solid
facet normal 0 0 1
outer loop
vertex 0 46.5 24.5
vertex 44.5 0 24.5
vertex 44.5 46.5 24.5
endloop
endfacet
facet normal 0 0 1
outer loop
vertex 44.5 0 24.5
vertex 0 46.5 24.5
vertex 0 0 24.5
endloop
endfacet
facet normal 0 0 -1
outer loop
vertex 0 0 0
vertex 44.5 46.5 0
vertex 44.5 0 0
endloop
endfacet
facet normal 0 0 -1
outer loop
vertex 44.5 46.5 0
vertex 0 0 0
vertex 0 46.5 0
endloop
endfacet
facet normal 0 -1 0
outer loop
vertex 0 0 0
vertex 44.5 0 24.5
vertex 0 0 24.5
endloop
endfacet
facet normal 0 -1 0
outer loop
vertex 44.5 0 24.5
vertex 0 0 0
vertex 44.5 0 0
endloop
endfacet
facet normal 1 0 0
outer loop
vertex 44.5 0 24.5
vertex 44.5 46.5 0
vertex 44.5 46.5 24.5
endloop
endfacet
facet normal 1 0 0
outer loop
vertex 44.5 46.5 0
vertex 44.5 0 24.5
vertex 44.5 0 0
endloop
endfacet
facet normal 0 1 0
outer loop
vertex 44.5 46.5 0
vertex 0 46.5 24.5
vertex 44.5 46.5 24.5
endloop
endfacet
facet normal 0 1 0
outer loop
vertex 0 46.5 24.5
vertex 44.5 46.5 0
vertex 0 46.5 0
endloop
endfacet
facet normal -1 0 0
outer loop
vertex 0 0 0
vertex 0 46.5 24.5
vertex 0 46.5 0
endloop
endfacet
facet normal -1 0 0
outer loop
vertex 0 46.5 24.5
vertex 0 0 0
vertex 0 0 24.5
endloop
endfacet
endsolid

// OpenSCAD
// file: e3d_v6_all_metall_hotend.scad
/*
Name: E3D-v6 All Metal HotEnd in OpenSCAD
Author: Jons Collasius from Germany/Hamburg

License: CC BY-NC-SA 4.0
License URL: https://creativecommons.org/licenses/by-nc-sa/4.0/

Creator of "E3D-v6 All Metal HotEnd": E3D Online - JR 
URL E3D v6: http://wiki.e3d-online.com/wiki/E3D-v6_Documentation
*/

// ######################################################################################################################

/* [Global] */
// detail level
detaillevel = 1; // [0:coarse render only outlines,1:fine render with all details]

//e3d($fs = 1);

// ######################################################################################################################
module e3d() {
	difference() {
		union() {
			translate([0,0,0]) fncylinder(r=8,h=7);
			translate([0,0,6]) fncylinder(r=6,h=8);
			translate([0,0,13]) fncylinder(r=8,h=8);
			translate([0,0,20]) fncylinder(r=11.15,h=26);
			translate([0,0,0]) fncylinder(r=8,h=7);
			translate([0,0,45]) fncylinder(r=2,h=4.1);
			translate([-8,-4.5,48.1]) chamfercube([16,20,11.5],side=[0.4,0.4,0.4,0.4],top=[0.4,0.4,0.4,0.4],bottom=[0.4,0.4,0.4,0.4]);
			translate([0,0,58.6]) fncylinder(r=2.5,h=3);
			translate([0,0,60.6]) fncylinder(r=4.03,h=3,$fn=6);
			translate([0,0,62.6]) fncylinder(r=3,r2=0.5,h=3);
		}
		if(detaillevel==1) {
			translate([0,0,-1]) fncylinder(r=1.6,h=64.1);
			translate([0,0,62.1]) fncylinder(r=0.25,h=4,fn=10);
			translate([0,0,16]) fnpipe(r=9,r2=4.475,h=1.5); 
			translate([0,0,18.5]) fnpipe(r=9,r2=4.475,h=1.5); 
			for ( i = [0 : 9] ) {
				translate([0,0,21+i*2.5]) fnpipe(r=12.15,r2=4.475+i*0.15,h=1.5); 
			}
			translate([-9,8,55.6]) rotate([0,90,0]) fncylinder(r=3.05, h=18);
			translate([-9,8,54.6]) cube([18,8.5,2]);
			translate([0,13,47.1]) fncylinder(r=1.4, h=13.5);
			translate([4.45,-1,54.8]) rotate([0,90,0]) fncylinder(r=1.4, h=4.45);
			translate([3.45,-2.5,57.6]) rotate([0,90,0]) fncylinder(r=1.15, h=5.45);
		}
	}
}

// ######################################################################################################################
module chamfercube(xyz=[0,0,0],side=[0,0,0,0],top=[0,0,0,0],bottom=[0,0,0,0],x=false,y=false,z=false) {
	translate([x==true?-xyz[0]/2:0,y==true?-xyz[1]/2:0,z==true?-xyz[2]/2:0]) difference() {
		cube(xyz);
		if(side[0]>=0) translate([0,0,xyz[2]/2]) rotate([0,0,45]) cube([side[0]*2,side[0]*3,xyz[2]+2],center=true);
		if(side[1]>=0) translate([xyz[0],0,xyz[2]/2]) rotate([0,0,-45]) cube([side[1]*2,side[1]*3,xyz[2]+2],center=true);
		if(side[2]>=0) translate([xyz[0],xyz[1],xyz[2]/2]) rotate([0,0,45]) cube([side[2]*2,side[2]*3,xyz[2]+2],center=true);
		if(side[3]>=0) translate([0,xyz[1],xyz[2]/2]) rotate([0,0,-45]) cube([side[3]*2,side[3]*3,xyz[2]+2],center=true);
		if(top[0]>=0) translate([xyz[0]/2,0,xyz[2]]) rotate([-45,0,0]) cube([xyz[0]+2,top[0]*2,top[0]*3,],center=true);
		if(top[2]>=0) translate([xyz[0]/2,xyz[1],xyz[2]]) rotate([45,0,0]) cube([xyz[0]+2,top[2]*2,top[2]*3,],center=true);
		if(top[3]>=0) translate([0,xyz[1]/2,xyz[2]]) rotate([0,45,0]) cube([top[3]*2,xyz[1]+2,top[3]*3,],center=true);
		if(top[1]>=0) translate([xyz[0],xyz[1]/2,xyz[2]]) rotate([0,-45,0]) cube([top[1]*2,xyz[1]+2,top[1]*3,],center=true);
		if(bottom[0]>=0) translate([xyz[0]/2,0,0]) rotate([45,0,0]) cube([xyz[0]+2,bottom[0]*2,bottom[0]*3,],center=true);
		if(bottom[2]>=0) translate([xyz[0]/2,xyz[1],0]) rotate([-45,0,0]) cube([xyz[0]+2,bottom[2]*2,bottom[2]*3,],center=true);
		if(bottom[3]>=0) translate([0,xyz[1]/2,0]) rotate([0,-45,0]) cube([bottom[3]*2,xyz[1]+2,bottom[3]*3,],center=true);
		if(bottom[1]>=0) translate([xyz[0],xyz[1]/2,0]) rotate([0,45,0]) cube([bottom[1]*2,xyz[1]+2,bottom[1]*3,],center=true);
	}	
}

// ######################################################################################################################
module fnpipe(r,r2,h) {
    difference() {
        fncylinder(r=r,h=h);
        translate([0,0,-1]) fncylinder(r=r2,h=h+2);
    }
}

// ######################################################################################################################
module fncylinder(r,r2,h,fn){
    cylinder(r=r,r2=r2,h=h);
    /*
    if (r2==undef) {
        cylinder(r=r,h=h);
    } else {
        cylinder(r=r,r2=r2,h=h);
    }*/
}
// main file
fnresolution = 1;
include <e3d_v6_all_metall_hotend.scad>;

xplate_t = 3.2;

/*
translate([0,xplate_t,0])
rotate([90,0,0])
translate([-111.75,0,0]) import("X_-_plate.stl");*/

//translate([0,0,65.6]) rotate([180,0,0]) e3d($fs = 1);
//import("E3D_V6_1.75mm_Universal_HotEnd_Mockup.stl");


module titan() {
    cube([44.5, 46.5, 24.5]);
    // chamfer 4.5 (left-bottom edge)
    
    // holes 
    //5.65, 7.65 
    
    // 15.5 45 degree line
    // 90 degree rot 3 hole
    
    // 1 bottom hole
    // 2.65, 1.65
    // dia 16.5
    // depth 1.4
    
    // 2 bottom hole
    // 12.5 dia
    // depth 6 mm
    
    // 3 bottom hole
    // dia same as 1
    // depth 5 mm
    
    // 15 mm offset from front
    // dia 34 third hole
    // depth 4mm
    
}

module emotor() {
    
    cube([42.3, 42.3, 22.75]);
    // hole 3mm offset [15.5, 15.5] mm from center
    // chamfer diagonal 54

    // front dia 22mm offset center depth 2mm
    
    
    // connector [16.25, 9, 6]
    
    // rotor dia 5mm offset center depth 20.75
    
    // rotor 2mm left offset depth 18.5
    
}

titan();
